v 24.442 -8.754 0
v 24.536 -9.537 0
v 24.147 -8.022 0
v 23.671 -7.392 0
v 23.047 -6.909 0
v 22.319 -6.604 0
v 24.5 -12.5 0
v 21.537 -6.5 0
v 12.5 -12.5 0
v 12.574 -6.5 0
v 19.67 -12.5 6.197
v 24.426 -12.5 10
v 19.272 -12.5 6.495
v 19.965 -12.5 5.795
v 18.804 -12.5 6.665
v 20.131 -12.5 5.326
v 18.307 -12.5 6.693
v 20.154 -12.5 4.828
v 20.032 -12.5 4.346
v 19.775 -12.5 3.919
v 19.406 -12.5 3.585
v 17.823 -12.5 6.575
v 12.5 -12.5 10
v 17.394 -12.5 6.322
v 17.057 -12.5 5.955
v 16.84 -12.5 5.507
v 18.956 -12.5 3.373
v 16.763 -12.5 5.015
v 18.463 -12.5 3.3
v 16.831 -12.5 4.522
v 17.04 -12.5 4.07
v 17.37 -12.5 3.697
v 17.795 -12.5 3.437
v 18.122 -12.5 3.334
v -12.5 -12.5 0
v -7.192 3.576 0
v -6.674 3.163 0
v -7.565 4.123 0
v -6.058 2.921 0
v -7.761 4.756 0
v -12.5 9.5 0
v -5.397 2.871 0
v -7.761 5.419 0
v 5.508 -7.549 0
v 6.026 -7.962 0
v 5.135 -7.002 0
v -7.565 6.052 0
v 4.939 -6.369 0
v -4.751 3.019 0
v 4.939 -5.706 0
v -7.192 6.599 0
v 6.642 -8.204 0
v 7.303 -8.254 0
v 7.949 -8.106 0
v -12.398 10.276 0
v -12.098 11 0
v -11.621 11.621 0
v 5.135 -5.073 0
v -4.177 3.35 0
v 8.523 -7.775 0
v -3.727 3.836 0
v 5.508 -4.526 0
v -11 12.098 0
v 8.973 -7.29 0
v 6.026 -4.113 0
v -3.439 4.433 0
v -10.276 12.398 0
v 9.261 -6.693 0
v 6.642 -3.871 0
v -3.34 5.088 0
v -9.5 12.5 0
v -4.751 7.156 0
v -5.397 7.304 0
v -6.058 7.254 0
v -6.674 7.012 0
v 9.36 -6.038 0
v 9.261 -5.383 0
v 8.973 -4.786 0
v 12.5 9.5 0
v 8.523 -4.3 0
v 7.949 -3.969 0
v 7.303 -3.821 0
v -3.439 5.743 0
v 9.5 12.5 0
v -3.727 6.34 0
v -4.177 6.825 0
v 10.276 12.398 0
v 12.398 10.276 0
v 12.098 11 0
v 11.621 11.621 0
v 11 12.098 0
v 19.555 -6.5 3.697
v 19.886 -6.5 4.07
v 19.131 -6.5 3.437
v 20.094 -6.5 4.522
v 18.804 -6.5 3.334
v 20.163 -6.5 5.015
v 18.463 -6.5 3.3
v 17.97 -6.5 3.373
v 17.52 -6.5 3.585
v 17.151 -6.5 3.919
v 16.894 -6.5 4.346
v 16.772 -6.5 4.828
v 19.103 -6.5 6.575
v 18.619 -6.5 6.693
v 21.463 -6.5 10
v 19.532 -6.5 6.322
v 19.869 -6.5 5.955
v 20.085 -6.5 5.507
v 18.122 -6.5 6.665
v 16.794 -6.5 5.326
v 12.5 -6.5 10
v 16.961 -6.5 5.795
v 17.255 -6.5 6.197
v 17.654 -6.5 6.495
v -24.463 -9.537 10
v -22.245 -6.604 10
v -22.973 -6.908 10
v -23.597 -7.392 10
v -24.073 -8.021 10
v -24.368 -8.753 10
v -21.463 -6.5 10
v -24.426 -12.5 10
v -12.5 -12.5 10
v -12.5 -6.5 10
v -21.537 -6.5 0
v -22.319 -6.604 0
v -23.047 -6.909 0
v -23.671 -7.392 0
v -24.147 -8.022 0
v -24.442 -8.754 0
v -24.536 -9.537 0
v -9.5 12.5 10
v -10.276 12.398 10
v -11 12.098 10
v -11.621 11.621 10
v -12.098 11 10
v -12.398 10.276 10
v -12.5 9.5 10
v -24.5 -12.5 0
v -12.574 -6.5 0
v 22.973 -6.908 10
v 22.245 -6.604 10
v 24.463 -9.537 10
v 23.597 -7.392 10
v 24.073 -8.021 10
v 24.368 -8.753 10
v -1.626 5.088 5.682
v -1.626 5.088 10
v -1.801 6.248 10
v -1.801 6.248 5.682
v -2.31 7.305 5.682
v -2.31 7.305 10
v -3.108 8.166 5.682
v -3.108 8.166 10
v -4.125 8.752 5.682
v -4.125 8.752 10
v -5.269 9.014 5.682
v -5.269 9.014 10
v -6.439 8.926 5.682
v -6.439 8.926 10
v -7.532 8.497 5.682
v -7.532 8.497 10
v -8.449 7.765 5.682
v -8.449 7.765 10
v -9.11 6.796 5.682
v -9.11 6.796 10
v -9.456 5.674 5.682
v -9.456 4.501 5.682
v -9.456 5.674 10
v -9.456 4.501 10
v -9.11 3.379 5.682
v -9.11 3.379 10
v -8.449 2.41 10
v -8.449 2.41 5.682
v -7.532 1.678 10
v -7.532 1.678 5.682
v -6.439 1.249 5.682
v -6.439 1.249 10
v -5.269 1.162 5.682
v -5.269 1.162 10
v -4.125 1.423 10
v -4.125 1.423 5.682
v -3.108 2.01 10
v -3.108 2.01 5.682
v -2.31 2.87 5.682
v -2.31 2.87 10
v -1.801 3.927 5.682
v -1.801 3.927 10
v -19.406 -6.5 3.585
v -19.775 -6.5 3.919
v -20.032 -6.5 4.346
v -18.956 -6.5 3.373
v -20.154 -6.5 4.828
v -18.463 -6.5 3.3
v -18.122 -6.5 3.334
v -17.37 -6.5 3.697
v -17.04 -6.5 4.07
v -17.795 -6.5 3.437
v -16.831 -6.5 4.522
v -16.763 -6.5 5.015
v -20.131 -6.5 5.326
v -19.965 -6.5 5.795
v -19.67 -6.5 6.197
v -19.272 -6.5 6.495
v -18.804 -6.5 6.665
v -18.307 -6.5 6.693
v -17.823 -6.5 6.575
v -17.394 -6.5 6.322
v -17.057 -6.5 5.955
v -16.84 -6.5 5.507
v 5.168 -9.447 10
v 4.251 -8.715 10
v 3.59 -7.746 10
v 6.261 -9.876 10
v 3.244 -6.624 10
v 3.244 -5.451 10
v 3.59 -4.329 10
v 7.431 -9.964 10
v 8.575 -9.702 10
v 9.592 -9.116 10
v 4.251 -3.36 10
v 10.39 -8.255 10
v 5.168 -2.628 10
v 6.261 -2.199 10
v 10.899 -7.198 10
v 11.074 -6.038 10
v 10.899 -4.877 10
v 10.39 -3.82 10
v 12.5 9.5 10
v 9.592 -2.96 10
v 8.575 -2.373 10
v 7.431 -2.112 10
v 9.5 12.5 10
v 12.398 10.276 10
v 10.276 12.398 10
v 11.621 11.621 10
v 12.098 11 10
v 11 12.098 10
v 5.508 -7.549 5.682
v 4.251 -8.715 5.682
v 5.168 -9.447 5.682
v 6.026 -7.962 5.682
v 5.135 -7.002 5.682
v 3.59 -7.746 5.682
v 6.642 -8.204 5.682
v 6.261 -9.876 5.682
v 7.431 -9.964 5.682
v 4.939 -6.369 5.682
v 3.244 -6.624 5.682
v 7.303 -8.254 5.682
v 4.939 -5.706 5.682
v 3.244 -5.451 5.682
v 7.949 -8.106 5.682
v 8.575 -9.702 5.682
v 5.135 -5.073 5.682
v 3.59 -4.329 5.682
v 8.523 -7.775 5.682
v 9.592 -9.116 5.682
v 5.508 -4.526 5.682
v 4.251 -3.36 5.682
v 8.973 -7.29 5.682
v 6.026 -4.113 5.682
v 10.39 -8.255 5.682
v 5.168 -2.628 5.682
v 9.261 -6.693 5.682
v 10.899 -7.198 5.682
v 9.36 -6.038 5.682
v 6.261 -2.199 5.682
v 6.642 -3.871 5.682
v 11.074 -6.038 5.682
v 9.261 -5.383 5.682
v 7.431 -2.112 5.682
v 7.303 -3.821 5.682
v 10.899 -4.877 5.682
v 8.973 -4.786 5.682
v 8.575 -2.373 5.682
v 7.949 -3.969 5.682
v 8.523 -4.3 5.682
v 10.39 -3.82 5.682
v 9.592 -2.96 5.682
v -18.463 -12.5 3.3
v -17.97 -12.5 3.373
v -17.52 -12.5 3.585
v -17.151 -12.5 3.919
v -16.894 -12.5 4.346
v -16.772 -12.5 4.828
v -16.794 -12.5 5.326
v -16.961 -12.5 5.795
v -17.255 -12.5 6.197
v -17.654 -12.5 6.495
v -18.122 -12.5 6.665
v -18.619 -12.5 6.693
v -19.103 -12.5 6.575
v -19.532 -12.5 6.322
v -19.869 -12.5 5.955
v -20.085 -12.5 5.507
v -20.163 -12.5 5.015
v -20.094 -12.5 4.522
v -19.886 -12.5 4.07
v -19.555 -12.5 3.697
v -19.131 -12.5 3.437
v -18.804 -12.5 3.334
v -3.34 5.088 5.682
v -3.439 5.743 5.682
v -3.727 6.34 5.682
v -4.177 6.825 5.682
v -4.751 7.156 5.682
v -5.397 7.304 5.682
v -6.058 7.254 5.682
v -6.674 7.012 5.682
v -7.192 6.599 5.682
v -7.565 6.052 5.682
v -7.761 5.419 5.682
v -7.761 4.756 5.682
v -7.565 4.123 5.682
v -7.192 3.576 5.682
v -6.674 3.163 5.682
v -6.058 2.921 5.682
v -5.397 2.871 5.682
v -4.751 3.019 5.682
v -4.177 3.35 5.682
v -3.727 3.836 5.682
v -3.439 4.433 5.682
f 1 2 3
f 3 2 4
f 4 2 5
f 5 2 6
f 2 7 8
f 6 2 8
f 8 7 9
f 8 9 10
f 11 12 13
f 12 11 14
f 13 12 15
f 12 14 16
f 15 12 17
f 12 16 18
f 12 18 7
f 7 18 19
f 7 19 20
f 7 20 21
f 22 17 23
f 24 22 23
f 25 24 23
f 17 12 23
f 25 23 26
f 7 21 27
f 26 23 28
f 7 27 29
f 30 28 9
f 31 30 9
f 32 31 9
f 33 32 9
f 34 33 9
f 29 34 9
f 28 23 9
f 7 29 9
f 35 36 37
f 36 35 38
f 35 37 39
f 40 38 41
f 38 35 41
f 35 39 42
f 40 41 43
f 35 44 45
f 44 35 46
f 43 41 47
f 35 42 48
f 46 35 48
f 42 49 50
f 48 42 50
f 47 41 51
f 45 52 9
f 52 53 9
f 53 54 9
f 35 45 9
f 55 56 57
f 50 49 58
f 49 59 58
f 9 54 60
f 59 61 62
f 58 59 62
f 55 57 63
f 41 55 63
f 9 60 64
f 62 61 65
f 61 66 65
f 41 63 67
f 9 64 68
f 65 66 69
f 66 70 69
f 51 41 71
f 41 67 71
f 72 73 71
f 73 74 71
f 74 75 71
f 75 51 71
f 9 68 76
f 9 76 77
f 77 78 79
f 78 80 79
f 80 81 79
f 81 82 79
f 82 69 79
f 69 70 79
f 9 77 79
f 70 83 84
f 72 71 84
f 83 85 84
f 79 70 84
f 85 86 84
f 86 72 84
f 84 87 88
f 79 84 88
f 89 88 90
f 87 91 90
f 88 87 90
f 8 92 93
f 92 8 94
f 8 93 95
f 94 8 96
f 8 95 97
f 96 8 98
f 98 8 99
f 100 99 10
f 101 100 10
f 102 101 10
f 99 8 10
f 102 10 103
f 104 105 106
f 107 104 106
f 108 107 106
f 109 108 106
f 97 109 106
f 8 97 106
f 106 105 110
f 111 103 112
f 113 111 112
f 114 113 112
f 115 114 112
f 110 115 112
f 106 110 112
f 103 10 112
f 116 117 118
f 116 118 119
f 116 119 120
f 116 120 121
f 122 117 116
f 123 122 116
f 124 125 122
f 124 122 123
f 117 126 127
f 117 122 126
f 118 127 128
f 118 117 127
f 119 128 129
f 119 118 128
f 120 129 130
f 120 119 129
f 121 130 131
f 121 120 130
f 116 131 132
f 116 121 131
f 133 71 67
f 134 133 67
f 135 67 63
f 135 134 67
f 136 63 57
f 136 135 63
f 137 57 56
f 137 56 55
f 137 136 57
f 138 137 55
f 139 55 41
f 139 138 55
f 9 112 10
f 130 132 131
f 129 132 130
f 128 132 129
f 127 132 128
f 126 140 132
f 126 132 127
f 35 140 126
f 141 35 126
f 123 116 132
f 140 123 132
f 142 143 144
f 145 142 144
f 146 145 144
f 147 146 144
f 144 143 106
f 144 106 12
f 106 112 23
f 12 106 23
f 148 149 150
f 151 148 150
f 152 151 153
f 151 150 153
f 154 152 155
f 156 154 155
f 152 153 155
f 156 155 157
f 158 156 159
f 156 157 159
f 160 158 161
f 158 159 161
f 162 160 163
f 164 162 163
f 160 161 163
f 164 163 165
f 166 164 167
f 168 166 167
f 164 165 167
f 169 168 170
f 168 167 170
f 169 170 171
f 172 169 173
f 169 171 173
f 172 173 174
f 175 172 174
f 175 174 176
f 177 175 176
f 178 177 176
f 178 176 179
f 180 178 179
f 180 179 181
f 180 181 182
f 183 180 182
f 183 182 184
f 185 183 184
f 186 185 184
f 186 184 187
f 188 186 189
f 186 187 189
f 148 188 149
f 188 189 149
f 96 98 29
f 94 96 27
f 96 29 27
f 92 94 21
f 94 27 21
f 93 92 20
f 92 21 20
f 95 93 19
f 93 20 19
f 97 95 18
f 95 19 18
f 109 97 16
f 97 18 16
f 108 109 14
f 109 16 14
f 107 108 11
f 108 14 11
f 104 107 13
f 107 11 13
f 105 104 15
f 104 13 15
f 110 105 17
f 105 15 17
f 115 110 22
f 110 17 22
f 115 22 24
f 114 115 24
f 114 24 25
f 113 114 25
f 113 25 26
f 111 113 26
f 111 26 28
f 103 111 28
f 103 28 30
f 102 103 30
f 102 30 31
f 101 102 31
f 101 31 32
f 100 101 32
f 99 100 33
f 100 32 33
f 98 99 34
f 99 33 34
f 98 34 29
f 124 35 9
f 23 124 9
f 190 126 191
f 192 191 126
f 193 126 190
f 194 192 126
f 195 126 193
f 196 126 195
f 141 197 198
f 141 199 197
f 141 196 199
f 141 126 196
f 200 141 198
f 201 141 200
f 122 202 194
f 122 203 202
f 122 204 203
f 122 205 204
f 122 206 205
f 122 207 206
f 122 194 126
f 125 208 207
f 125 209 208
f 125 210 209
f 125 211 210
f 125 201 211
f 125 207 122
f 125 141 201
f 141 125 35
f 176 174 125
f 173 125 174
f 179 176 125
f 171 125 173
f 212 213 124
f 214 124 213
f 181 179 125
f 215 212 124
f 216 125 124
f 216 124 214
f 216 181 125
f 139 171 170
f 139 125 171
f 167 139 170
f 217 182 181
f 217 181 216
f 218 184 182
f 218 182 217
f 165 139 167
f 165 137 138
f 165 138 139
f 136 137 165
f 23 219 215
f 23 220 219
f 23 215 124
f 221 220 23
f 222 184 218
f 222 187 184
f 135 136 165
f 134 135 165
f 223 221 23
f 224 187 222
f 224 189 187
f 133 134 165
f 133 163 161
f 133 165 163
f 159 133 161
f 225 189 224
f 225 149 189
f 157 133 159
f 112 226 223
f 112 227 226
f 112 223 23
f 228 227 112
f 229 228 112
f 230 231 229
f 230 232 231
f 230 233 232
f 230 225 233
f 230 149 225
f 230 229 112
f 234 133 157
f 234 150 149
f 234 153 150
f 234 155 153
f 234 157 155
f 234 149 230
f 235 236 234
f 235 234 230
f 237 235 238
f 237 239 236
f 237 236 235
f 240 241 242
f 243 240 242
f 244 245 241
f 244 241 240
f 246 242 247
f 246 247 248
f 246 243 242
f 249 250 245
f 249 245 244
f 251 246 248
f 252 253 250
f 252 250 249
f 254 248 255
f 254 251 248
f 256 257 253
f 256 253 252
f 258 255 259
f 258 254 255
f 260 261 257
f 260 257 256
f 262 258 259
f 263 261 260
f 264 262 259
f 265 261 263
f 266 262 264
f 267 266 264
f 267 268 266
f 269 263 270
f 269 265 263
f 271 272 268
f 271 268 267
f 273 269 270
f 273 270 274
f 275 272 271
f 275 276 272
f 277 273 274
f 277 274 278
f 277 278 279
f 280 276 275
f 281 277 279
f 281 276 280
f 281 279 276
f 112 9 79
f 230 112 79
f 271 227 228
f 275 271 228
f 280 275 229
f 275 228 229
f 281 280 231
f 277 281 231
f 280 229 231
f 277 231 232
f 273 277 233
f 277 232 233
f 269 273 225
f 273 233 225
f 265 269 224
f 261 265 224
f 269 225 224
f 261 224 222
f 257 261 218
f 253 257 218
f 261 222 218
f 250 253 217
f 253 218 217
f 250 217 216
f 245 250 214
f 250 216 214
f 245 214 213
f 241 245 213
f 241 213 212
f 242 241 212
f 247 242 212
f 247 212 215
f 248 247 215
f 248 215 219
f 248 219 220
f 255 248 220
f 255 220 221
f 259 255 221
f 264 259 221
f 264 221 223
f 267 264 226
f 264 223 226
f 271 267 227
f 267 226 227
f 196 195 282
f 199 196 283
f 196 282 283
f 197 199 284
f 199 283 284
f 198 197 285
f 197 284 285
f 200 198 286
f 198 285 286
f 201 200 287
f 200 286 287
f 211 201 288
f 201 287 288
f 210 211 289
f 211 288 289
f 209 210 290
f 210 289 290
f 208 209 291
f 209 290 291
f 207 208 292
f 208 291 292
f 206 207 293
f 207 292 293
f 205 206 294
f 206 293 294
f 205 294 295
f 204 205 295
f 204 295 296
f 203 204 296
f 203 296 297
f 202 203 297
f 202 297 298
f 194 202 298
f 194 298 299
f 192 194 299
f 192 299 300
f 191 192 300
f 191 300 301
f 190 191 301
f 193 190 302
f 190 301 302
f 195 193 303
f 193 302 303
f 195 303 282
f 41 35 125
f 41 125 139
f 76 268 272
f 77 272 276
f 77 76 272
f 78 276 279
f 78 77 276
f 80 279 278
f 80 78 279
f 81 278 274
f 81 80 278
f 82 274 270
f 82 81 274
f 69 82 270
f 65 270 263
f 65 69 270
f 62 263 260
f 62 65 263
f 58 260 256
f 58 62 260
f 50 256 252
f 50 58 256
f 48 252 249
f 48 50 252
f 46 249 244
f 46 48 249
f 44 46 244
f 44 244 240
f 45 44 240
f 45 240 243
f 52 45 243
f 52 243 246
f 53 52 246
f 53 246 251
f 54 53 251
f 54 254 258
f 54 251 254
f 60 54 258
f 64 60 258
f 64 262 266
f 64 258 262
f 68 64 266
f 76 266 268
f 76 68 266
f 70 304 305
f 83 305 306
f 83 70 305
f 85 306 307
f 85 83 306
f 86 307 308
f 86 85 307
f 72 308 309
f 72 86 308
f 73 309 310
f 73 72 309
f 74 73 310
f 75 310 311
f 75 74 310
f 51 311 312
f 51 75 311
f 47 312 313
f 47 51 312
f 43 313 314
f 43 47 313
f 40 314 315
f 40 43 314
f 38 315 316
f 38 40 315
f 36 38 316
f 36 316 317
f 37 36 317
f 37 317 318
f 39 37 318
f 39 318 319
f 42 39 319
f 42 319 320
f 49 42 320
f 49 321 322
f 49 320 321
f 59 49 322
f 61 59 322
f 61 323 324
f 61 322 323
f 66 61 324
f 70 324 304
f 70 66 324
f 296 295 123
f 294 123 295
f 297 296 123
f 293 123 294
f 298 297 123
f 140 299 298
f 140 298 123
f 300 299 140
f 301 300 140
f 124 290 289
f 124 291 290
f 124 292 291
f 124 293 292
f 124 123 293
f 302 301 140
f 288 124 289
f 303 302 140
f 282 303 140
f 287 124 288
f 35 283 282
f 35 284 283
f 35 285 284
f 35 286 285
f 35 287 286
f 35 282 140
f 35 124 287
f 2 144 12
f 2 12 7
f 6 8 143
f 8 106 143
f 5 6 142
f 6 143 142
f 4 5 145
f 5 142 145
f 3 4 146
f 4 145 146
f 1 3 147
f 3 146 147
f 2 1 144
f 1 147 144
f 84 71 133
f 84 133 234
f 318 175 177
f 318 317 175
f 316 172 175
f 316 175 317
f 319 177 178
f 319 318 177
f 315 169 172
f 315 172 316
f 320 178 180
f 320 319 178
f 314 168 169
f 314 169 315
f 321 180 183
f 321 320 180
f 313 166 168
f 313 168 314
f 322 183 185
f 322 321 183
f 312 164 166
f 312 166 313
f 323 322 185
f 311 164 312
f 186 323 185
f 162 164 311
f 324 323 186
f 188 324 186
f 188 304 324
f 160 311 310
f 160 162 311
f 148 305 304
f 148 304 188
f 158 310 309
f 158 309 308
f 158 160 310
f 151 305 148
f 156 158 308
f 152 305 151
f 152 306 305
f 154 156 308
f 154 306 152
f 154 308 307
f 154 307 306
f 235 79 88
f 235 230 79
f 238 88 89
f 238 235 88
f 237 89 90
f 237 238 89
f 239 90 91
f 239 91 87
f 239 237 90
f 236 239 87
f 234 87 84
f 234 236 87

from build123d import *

# Parameters (mm, degrees)
SKETCH1_W           = 25
SKETCH1_H           = 25
SKETCH1_R           = 2.2225
BOSS_EXTRUDE1_DEPTH = 10
SKETCH2_R           = 3.937
CUT_EXTRUDE3_DEPTH  = 4.318
BOSS_EXTRUDE2_DEPTH = 12
FILLET1_R           = 3
CUT_EXTRUDE4_REACH  = 38.454
SKETCH3_R           = 1.7
FILLET2_R           = 3


with BuildPart() as part:
    # Sketch1 → Boss-Extrude1 (new body)
    with BuildSketch(Plane.XY):
        Rectangle(SKETCH1_W, SKETCH1_H)
        with Locations((-5.563, 5.0876)):
            Circle(SKETCH1_R, mode=Mode.SUBTRACT)
        with Locations((7.137, -6.0376)):
            Circle(SKETCH1_R, mode=Mode.SUBTRACT)
    extrude(amount=BOSS_EXTRUDE1_DEPTH)

    # Sketch2 → Cut-Extrude3 (cut)
    with BuildSketch(Plane.XY.offset(10)):
        with Locations((-5.563, 5.0876)):
            Circle(SKETCH2_R)
        with Locations((7.137, -6.0376)):
            Circle(SKETCH2_R)
    extrude(amount=-CUT_EXTRUDE3_DEPTH, mode=Mode.SUBTRACT)

    # 3DSketch1 → Boss-Extrude2 (add, along a direction that is not the sketch's normal)
    with BuildSketch(Plane(origin=(-12.5, -12.5, 0), x_dir=(0, 0.5144957554275265, 0.8574929257125442), z_dir=(-0.999897134802458, -0.012298966175927167, 0.007379379705556298))):
        Polygon((0, 0), (3.086974533, 5.144957554), (11.66190379, 0), (8.574929257, -5.144957554), align=None)
    boss_extrude2 = extrude(amount=BOSS_EXTRUDE2_DEPTH, dir=(-1, 0, 0))

    # Mirror1: Boss-Extrude2 across plane
    add(boss_extrude2.mirror(Plane(origin=(0, 0, 0), x_dir=(0, 0, 1), z_dir=(1, 0, 0))))

    # Fillet1
    fillet1_edges = [part.edges().sort_by_distance(p)[0] for p in [
        (12.5, 12.5, 5),
        (-12.5, 12.5, 5),
    ]]
    fillet(fillet1_edges, radius=FILLET1_R)

    # Cut-Extrude4: up to this plane
    cut_extrude4_end = Plane(origin=(-12.573793797, -6.500453817, 0.00027229), z_dir=(0, 0.9999999989701944, -4.538294048436099e-05))
    # Sketch3 → Cut-Extrude4 (cut, up to the surface)
    with BuildSketch(Plane.XZ.offset(12.5), mode=Mode.PRIVATE) as cut_extrude4_sk1:
        with Locations(Location((-18.462939729, 4.999863855, 0), (0, 0, 270))):
            Circle(SKETCH3_R)
    cut_extrude4_tool1 = split(extrude(cut_extrude4_sk1.sketch, amount=-CUT_EXTRUDE4_REACH, mode=Mode.PRIVATE), bisect_by=cut_extrude4_end, keep=Keep.BOTH, mode=Mode.PRIVATE)
    add(cut_extrude4_tool1.solids().sort_by_distance((-18.46294, -12.5, 4.999864))[0], mode=Mode.SUBTRACT)
    # Sketch3 → Cut-Extrude4 (cut, up to the surface)
    with BuildSketch(Plane.XZ.offset(12.5), mode=Mode.PRIVATE) as cut_extrude4_sk2:
        with Locations(Location((18.462939729, 4.999863855, 0), (0, 0, 270))):
            Circle(SKETCH3_R)
    cut_extrude4_tool2 = split(extrude(cut_extrude4_sk2.sketch, amount=-CUT_EXTRUDE4_REACH, mode=Mode.PRIVATE), bisect_by=cut_extrude4_end, keep=Keep.BOTH, mode=Mode.PRIVATE)
    add(cut_extrude4_tool2.solids().sort_by_distance((18.46294, -12.5, 4.999864))[0], mode=Mode.SUBTRACT)

    # Fillet2
    fillet2_edges = [part.edges().sort_by_distance(p)[0] for p in [
        (-24.536896899, -6.500226909, 5.000136145),
        (24.536896899, -6.500226909, 5.000136145),
    ]]
    fillet(fillet2_edges, radius=FILLET2_R)


solid = part.part
